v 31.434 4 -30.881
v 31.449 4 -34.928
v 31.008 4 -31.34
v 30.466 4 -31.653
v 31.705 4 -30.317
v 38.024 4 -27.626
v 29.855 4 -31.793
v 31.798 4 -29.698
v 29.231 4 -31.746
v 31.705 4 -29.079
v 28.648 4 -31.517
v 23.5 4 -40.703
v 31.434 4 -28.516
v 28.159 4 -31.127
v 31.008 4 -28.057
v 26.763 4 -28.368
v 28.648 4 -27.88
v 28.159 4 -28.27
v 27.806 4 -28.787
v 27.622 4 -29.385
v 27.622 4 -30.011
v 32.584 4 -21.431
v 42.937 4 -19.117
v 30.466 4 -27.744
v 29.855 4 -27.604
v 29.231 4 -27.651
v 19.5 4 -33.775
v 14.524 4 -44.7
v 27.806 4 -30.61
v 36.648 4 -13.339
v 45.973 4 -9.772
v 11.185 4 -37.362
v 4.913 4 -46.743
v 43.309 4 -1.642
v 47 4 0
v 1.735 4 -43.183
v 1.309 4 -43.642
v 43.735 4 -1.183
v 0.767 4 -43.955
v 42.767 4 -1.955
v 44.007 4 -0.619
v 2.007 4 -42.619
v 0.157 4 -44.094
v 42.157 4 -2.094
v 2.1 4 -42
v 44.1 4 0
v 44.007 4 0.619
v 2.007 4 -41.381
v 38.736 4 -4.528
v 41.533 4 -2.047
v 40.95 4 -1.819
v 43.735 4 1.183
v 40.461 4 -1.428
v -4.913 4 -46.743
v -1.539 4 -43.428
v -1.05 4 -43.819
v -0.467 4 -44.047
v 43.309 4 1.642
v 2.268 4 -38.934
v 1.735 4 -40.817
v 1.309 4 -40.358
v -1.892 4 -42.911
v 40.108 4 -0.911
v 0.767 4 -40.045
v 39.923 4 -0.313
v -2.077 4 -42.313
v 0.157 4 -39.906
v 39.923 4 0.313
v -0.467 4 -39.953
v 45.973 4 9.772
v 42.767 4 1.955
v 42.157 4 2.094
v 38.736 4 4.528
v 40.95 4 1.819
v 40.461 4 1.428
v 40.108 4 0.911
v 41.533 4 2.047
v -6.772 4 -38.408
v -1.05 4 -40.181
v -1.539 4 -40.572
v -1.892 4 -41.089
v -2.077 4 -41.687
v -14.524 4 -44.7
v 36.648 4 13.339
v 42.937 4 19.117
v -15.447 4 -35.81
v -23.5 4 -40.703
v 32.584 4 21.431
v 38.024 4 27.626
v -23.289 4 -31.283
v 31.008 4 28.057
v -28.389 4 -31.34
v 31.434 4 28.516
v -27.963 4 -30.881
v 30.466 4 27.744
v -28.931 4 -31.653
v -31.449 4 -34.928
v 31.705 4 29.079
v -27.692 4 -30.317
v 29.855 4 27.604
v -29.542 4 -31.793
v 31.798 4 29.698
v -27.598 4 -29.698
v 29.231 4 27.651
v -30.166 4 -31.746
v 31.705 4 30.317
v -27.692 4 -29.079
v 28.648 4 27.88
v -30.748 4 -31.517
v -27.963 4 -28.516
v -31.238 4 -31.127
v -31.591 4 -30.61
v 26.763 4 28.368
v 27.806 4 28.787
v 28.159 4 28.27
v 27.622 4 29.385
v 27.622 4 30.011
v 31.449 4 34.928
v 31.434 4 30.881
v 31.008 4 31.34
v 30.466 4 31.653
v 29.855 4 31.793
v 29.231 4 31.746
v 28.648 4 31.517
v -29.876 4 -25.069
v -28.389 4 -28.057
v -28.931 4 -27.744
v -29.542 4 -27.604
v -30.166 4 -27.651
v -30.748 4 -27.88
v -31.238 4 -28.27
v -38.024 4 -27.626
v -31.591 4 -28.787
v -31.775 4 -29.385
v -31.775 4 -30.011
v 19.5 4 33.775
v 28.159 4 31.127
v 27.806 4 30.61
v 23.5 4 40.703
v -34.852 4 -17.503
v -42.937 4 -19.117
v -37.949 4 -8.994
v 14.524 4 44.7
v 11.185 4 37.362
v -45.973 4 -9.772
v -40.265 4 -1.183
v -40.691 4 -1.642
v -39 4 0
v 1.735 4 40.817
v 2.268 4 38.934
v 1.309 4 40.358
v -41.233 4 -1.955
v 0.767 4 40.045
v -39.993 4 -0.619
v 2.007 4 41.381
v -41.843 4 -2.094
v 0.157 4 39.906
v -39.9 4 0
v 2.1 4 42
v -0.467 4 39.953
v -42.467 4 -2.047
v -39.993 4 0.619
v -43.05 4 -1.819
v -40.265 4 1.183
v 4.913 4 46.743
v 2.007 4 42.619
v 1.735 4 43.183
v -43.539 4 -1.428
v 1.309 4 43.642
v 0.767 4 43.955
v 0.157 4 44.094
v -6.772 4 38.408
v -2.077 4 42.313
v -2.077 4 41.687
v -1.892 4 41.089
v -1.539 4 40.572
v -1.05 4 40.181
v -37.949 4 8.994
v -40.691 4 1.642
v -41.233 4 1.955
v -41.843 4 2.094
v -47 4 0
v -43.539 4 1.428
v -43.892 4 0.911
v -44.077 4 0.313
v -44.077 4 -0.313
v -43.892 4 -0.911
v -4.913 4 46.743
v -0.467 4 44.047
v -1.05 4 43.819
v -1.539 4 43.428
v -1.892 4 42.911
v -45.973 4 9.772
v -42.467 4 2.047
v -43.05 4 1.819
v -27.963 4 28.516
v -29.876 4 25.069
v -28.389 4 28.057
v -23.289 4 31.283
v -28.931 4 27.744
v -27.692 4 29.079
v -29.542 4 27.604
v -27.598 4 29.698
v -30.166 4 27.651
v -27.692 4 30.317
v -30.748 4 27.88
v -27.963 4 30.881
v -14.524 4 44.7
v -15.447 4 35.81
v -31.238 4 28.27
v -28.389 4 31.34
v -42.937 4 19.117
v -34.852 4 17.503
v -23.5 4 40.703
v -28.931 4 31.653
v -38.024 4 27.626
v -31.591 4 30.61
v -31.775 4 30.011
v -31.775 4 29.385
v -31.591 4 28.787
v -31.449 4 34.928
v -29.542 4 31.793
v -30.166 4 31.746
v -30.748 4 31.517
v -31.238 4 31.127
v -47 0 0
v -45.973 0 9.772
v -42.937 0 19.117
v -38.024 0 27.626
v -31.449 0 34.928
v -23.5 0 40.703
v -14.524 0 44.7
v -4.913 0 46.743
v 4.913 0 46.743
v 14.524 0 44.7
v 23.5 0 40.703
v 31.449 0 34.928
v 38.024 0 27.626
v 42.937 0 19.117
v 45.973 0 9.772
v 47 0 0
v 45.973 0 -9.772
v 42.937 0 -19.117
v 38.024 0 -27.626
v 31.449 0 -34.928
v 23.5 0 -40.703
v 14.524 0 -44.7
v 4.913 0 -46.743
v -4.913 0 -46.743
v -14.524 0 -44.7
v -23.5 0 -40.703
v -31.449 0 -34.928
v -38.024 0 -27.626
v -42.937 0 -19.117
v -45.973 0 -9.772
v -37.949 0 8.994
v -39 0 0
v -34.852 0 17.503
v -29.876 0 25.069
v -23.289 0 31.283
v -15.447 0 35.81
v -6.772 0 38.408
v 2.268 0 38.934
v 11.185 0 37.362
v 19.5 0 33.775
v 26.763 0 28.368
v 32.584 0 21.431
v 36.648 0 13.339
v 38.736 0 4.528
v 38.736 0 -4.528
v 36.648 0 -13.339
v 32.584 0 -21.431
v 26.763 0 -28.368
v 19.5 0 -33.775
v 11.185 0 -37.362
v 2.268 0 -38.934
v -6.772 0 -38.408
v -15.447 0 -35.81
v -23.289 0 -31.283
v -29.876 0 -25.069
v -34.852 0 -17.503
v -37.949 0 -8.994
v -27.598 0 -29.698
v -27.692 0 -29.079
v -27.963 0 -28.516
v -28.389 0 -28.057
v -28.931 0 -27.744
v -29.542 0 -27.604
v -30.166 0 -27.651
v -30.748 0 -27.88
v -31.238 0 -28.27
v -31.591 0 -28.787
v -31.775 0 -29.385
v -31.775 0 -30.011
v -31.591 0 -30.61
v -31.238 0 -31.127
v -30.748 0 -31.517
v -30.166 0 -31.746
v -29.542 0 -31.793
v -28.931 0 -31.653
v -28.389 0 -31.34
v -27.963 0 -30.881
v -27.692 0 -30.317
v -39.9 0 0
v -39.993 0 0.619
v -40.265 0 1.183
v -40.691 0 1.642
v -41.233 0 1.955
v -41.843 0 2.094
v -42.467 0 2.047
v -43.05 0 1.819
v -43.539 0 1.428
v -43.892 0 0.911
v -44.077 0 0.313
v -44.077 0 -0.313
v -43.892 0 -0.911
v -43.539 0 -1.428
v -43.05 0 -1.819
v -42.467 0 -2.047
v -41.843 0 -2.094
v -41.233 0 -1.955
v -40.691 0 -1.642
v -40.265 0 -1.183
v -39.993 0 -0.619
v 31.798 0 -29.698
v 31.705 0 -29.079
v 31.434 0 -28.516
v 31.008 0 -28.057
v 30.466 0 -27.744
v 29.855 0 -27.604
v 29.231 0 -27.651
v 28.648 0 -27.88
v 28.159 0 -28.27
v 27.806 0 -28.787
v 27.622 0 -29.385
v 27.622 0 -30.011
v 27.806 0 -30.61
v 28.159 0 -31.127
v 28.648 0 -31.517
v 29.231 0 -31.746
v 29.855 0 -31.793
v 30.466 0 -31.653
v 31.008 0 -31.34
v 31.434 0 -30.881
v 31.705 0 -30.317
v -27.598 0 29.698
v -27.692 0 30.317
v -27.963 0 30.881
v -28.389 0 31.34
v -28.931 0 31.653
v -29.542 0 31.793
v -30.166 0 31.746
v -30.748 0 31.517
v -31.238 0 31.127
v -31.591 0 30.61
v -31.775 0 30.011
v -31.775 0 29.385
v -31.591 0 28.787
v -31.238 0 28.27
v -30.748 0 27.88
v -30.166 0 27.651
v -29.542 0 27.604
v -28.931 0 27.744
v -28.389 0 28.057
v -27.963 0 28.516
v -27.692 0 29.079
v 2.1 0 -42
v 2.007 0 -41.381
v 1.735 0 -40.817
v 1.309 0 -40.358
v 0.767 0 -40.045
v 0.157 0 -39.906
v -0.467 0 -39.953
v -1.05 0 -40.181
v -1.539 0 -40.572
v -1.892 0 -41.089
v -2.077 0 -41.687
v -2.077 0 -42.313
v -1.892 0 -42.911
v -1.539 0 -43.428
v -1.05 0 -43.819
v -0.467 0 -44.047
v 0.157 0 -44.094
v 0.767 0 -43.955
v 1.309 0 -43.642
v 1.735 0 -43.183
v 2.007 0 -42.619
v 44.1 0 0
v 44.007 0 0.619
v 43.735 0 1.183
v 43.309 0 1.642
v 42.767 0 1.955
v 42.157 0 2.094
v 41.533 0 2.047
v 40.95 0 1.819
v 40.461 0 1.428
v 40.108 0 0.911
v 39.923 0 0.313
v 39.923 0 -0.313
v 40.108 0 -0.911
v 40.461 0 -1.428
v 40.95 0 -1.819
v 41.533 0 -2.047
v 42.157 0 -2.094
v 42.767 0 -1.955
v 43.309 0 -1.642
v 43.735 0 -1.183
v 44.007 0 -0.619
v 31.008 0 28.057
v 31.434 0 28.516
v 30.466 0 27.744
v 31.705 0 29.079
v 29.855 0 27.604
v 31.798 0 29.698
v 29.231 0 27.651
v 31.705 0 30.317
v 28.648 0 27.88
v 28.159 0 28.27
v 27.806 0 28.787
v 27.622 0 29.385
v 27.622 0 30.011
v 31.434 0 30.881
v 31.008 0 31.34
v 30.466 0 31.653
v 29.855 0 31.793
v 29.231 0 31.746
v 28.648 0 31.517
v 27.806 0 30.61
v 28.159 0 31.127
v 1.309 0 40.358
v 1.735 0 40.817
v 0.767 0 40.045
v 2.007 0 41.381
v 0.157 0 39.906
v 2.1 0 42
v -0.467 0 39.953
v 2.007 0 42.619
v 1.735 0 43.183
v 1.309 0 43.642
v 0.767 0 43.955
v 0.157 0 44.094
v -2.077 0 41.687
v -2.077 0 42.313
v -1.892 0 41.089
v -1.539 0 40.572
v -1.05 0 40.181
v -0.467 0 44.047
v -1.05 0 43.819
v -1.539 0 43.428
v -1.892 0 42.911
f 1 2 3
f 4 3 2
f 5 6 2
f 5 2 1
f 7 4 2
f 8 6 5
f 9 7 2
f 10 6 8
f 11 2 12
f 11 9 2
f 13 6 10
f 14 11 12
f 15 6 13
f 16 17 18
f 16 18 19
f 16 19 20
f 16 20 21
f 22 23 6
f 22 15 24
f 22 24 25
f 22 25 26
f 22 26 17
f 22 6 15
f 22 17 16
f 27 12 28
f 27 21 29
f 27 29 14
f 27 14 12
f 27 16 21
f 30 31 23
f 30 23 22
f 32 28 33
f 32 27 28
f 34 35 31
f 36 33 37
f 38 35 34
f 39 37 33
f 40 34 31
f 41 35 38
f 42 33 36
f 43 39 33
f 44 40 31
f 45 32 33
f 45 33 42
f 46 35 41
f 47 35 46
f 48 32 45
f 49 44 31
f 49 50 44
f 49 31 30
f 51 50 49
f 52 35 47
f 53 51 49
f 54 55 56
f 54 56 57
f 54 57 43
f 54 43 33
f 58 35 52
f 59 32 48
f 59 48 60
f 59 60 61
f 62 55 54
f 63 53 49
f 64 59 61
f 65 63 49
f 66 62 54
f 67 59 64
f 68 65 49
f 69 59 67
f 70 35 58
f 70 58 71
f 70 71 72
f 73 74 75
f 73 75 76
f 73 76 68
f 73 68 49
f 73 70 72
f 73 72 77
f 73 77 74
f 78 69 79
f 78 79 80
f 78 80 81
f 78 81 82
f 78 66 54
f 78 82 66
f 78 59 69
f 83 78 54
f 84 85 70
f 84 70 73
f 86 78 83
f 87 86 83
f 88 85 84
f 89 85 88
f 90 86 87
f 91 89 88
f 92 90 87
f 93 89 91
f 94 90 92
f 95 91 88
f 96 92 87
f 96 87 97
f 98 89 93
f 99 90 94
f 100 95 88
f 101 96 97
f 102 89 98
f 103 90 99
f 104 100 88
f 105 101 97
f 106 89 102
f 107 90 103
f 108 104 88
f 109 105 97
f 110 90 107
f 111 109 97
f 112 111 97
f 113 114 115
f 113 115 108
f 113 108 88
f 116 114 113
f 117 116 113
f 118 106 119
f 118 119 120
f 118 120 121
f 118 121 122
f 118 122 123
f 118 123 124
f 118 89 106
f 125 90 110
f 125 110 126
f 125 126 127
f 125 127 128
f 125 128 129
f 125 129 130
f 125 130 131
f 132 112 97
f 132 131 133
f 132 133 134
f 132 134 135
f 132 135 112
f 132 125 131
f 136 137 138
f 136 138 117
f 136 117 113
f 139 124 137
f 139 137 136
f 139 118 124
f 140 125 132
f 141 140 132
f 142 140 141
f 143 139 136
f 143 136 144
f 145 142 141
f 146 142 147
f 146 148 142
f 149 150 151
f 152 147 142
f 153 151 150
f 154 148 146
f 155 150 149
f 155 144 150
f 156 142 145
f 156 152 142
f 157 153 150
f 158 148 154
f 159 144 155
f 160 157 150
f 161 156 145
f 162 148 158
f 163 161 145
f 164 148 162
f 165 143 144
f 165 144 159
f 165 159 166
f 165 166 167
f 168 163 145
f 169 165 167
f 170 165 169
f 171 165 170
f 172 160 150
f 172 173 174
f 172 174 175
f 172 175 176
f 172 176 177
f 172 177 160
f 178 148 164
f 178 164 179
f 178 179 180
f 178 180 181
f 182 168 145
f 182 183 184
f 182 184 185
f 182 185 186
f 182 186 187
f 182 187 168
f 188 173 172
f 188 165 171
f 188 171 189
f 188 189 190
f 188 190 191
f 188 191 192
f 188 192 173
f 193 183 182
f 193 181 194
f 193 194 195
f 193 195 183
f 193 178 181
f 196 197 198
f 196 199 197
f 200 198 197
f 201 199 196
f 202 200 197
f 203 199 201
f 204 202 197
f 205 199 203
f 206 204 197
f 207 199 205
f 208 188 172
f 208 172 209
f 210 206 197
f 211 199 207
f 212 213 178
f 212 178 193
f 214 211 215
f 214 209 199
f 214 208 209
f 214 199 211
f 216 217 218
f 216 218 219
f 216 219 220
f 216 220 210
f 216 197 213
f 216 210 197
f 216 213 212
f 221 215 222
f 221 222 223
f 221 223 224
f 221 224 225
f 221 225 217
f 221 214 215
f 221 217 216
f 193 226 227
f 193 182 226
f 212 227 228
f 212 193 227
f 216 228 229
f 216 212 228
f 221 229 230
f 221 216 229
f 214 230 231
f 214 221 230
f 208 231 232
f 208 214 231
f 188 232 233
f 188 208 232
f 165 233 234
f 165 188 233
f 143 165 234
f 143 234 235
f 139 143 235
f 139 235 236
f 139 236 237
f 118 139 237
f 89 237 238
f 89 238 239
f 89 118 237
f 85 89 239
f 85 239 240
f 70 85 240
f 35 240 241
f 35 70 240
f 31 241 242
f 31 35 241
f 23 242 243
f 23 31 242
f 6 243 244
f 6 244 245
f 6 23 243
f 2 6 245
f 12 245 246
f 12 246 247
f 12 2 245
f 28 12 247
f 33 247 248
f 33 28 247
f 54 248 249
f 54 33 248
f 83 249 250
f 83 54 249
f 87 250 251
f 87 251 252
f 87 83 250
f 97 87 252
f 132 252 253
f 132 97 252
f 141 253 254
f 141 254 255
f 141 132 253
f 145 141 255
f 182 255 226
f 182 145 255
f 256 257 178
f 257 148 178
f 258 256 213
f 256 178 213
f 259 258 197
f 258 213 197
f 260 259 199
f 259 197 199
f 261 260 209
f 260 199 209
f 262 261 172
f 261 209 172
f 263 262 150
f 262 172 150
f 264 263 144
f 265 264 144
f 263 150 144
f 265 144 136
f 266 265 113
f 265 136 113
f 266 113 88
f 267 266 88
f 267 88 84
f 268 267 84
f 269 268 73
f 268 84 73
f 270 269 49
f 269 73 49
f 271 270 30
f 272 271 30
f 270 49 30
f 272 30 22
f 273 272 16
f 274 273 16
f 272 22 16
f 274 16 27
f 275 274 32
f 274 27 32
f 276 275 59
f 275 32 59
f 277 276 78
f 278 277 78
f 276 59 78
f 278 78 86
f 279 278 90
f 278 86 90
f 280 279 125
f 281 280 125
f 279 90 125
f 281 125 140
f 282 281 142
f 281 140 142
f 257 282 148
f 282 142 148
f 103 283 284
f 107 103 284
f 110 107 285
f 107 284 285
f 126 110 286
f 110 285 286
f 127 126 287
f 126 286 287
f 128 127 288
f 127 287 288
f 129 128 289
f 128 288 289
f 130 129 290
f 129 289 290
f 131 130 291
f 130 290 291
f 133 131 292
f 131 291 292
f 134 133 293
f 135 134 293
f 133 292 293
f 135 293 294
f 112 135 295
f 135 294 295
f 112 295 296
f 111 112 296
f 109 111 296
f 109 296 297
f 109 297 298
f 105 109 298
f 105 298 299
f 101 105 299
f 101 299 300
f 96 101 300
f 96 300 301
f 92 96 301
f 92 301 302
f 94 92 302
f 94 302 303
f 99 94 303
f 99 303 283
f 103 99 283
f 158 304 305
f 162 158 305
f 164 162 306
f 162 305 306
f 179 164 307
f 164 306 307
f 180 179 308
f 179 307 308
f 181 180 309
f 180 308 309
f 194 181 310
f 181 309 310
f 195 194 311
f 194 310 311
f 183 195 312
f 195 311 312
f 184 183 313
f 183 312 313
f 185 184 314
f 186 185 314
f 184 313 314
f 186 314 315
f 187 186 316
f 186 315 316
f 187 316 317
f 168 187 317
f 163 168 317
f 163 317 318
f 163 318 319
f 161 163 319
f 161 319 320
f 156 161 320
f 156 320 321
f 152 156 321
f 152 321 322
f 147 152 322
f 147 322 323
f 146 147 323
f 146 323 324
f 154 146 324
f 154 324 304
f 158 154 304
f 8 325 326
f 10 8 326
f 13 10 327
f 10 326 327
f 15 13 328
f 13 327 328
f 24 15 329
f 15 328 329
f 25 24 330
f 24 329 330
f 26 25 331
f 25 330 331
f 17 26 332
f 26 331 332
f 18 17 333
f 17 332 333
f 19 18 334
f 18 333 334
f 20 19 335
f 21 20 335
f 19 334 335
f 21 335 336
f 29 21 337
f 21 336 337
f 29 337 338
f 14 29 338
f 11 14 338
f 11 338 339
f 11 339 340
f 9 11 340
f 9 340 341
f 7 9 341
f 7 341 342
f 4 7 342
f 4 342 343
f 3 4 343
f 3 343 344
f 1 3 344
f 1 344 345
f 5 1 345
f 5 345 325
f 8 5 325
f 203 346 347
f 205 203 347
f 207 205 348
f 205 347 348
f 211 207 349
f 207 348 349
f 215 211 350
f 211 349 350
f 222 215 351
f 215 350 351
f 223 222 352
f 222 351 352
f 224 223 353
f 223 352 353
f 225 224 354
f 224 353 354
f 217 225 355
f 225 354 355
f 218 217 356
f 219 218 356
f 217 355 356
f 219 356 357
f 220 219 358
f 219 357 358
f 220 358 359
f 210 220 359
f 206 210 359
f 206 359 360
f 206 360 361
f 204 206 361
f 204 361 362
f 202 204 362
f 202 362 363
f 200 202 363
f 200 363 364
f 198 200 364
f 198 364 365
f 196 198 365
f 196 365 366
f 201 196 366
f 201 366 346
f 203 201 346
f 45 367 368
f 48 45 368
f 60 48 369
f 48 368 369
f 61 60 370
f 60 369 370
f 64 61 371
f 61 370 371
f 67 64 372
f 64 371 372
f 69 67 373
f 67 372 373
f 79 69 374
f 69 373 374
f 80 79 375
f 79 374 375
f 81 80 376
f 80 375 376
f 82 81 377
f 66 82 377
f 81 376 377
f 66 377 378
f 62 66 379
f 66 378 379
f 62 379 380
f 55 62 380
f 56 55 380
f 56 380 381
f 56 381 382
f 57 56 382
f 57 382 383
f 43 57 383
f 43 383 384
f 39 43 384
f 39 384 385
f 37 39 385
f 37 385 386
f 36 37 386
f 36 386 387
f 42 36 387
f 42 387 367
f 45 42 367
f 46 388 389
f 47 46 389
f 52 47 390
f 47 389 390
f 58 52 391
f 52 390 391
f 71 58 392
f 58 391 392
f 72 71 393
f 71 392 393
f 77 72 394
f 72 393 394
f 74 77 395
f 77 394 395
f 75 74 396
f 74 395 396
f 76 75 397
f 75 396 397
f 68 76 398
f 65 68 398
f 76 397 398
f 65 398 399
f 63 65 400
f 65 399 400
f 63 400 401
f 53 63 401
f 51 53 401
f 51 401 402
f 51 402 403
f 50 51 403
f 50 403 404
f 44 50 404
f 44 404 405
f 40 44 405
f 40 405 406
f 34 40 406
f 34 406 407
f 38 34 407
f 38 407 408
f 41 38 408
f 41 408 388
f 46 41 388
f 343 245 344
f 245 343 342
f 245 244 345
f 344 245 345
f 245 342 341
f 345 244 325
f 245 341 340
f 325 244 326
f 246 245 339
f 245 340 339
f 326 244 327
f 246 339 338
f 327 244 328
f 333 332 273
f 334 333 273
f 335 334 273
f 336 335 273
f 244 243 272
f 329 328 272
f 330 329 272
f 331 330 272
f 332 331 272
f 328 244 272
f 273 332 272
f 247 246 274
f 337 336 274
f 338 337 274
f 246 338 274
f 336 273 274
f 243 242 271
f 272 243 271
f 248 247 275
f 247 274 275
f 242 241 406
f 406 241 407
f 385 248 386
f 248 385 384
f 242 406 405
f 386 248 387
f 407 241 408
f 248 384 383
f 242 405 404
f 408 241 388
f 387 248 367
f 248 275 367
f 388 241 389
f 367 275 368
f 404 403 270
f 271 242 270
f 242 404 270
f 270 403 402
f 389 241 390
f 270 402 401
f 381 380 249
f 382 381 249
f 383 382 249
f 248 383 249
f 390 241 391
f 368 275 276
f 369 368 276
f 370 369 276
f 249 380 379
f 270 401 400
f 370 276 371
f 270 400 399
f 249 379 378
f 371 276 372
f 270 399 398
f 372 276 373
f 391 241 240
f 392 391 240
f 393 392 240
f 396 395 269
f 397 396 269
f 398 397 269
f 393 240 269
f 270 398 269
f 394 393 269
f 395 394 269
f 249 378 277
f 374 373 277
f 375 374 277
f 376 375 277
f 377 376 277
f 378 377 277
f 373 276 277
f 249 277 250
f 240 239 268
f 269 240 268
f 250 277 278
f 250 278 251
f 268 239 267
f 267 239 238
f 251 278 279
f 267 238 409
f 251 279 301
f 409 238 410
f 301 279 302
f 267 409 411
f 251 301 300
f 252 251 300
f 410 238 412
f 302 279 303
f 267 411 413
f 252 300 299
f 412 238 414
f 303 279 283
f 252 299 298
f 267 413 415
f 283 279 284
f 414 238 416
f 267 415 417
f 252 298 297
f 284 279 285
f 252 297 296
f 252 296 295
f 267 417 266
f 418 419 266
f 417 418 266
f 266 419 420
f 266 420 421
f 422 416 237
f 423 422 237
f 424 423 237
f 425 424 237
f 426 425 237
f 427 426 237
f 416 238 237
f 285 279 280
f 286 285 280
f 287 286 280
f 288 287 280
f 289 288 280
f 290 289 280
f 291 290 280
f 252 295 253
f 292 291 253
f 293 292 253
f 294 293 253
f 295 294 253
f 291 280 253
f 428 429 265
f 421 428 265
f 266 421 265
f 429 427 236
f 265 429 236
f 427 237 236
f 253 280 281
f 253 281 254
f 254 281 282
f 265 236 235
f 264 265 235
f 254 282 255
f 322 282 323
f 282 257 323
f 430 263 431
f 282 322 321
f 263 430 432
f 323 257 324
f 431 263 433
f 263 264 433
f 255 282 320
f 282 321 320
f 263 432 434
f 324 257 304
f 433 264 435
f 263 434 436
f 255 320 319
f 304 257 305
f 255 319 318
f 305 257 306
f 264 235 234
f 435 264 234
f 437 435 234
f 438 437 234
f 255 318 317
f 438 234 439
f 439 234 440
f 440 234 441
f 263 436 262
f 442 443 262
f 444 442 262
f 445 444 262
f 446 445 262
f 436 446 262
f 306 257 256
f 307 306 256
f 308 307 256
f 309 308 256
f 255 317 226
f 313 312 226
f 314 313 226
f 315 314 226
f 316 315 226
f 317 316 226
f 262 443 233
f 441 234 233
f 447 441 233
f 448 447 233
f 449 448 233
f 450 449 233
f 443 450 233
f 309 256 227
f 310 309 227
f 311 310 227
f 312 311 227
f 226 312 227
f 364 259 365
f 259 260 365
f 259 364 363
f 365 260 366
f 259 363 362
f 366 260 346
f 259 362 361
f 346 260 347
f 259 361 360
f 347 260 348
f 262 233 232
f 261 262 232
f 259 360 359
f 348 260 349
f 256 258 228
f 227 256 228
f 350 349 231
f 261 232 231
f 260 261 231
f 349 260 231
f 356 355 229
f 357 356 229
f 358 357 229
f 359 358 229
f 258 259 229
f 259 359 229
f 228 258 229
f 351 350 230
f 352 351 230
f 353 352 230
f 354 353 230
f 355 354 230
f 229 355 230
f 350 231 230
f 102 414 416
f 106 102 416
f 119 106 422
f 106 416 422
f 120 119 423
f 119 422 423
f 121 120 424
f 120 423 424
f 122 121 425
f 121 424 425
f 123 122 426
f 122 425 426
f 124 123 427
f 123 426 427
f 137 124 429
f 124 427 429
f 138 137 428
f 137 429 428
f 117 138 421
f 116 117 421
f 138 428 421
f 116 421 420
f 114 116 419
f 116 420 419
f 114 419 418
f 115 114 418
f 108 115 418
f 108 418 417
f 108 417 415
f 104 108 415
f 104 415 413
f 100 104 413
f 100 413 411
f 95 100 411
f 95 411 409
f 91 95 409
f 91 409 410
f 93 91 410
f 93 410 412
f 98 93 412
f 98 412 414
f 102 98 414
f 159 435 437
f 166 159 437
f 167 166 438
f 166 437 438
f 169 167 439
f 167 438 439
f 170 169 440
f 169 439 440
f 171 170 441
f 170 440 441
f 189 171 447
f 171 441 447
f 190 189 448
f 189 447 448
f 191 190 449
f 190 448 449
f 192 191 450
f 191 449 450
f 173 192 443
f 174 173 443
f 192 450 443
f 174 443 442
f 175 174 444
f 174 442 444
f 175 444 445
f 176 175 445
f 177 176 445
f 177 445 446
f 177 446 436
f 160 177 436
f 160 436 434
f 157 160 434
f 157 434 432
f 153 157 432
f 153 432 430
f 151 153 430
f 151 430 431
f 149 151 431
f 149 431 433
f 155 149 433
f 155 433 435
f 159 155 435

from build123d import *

# Parameters (mm, degrees)
SKETCH_1_W          = 8
SKETCH_1_H          = 4
SKETCH_2_R          = 2.1
CUT_EXTRUDE_1_DEPTH = 10


with BuildPart() as part:
    # 草图1 → 旋转1 (revolve)
    with BuildSketch(Plane.XY):
        with Locations((-43, 2)):
            Rectangle(SKETCH_1_W, SKETCH_1_H)
    revolve(axis=Axis((0, 0, 0), (0, 1, 0)))

    # 草图2 → 切除-拉伸1 (cut)
    with BuildSketch(Plane.XZ):
        with Locations((0, 42)):
            Circle(SKETCH_2_R)
        with Locations((29.69848481, 29.69848481)):
            Circle(SKETCH_2_R)
        with Locations((42, 0)):
            Circle(SKETCH_2_R)
        with Locations((29.69848481, -29.69848481)):
            Circle(SKETCH_2_R)
        with Locations((0, -42)):
            Circle(SKETCH_2_R)
        with Locations((-29.69848481, -29.69848481)):
            Circle(SKETCH_2_R)
        with Locations((-42, 0)):
            Circle(SKETCH_2_R)
        with Locations((-29.69848481, 29.69848481)):
            Circle(SKETCH_2_R)
    extrude(amount=-CUT_EXTRUDE_1_DEPTH, mode=Mode.SUBTRACT)


solid = part.part
